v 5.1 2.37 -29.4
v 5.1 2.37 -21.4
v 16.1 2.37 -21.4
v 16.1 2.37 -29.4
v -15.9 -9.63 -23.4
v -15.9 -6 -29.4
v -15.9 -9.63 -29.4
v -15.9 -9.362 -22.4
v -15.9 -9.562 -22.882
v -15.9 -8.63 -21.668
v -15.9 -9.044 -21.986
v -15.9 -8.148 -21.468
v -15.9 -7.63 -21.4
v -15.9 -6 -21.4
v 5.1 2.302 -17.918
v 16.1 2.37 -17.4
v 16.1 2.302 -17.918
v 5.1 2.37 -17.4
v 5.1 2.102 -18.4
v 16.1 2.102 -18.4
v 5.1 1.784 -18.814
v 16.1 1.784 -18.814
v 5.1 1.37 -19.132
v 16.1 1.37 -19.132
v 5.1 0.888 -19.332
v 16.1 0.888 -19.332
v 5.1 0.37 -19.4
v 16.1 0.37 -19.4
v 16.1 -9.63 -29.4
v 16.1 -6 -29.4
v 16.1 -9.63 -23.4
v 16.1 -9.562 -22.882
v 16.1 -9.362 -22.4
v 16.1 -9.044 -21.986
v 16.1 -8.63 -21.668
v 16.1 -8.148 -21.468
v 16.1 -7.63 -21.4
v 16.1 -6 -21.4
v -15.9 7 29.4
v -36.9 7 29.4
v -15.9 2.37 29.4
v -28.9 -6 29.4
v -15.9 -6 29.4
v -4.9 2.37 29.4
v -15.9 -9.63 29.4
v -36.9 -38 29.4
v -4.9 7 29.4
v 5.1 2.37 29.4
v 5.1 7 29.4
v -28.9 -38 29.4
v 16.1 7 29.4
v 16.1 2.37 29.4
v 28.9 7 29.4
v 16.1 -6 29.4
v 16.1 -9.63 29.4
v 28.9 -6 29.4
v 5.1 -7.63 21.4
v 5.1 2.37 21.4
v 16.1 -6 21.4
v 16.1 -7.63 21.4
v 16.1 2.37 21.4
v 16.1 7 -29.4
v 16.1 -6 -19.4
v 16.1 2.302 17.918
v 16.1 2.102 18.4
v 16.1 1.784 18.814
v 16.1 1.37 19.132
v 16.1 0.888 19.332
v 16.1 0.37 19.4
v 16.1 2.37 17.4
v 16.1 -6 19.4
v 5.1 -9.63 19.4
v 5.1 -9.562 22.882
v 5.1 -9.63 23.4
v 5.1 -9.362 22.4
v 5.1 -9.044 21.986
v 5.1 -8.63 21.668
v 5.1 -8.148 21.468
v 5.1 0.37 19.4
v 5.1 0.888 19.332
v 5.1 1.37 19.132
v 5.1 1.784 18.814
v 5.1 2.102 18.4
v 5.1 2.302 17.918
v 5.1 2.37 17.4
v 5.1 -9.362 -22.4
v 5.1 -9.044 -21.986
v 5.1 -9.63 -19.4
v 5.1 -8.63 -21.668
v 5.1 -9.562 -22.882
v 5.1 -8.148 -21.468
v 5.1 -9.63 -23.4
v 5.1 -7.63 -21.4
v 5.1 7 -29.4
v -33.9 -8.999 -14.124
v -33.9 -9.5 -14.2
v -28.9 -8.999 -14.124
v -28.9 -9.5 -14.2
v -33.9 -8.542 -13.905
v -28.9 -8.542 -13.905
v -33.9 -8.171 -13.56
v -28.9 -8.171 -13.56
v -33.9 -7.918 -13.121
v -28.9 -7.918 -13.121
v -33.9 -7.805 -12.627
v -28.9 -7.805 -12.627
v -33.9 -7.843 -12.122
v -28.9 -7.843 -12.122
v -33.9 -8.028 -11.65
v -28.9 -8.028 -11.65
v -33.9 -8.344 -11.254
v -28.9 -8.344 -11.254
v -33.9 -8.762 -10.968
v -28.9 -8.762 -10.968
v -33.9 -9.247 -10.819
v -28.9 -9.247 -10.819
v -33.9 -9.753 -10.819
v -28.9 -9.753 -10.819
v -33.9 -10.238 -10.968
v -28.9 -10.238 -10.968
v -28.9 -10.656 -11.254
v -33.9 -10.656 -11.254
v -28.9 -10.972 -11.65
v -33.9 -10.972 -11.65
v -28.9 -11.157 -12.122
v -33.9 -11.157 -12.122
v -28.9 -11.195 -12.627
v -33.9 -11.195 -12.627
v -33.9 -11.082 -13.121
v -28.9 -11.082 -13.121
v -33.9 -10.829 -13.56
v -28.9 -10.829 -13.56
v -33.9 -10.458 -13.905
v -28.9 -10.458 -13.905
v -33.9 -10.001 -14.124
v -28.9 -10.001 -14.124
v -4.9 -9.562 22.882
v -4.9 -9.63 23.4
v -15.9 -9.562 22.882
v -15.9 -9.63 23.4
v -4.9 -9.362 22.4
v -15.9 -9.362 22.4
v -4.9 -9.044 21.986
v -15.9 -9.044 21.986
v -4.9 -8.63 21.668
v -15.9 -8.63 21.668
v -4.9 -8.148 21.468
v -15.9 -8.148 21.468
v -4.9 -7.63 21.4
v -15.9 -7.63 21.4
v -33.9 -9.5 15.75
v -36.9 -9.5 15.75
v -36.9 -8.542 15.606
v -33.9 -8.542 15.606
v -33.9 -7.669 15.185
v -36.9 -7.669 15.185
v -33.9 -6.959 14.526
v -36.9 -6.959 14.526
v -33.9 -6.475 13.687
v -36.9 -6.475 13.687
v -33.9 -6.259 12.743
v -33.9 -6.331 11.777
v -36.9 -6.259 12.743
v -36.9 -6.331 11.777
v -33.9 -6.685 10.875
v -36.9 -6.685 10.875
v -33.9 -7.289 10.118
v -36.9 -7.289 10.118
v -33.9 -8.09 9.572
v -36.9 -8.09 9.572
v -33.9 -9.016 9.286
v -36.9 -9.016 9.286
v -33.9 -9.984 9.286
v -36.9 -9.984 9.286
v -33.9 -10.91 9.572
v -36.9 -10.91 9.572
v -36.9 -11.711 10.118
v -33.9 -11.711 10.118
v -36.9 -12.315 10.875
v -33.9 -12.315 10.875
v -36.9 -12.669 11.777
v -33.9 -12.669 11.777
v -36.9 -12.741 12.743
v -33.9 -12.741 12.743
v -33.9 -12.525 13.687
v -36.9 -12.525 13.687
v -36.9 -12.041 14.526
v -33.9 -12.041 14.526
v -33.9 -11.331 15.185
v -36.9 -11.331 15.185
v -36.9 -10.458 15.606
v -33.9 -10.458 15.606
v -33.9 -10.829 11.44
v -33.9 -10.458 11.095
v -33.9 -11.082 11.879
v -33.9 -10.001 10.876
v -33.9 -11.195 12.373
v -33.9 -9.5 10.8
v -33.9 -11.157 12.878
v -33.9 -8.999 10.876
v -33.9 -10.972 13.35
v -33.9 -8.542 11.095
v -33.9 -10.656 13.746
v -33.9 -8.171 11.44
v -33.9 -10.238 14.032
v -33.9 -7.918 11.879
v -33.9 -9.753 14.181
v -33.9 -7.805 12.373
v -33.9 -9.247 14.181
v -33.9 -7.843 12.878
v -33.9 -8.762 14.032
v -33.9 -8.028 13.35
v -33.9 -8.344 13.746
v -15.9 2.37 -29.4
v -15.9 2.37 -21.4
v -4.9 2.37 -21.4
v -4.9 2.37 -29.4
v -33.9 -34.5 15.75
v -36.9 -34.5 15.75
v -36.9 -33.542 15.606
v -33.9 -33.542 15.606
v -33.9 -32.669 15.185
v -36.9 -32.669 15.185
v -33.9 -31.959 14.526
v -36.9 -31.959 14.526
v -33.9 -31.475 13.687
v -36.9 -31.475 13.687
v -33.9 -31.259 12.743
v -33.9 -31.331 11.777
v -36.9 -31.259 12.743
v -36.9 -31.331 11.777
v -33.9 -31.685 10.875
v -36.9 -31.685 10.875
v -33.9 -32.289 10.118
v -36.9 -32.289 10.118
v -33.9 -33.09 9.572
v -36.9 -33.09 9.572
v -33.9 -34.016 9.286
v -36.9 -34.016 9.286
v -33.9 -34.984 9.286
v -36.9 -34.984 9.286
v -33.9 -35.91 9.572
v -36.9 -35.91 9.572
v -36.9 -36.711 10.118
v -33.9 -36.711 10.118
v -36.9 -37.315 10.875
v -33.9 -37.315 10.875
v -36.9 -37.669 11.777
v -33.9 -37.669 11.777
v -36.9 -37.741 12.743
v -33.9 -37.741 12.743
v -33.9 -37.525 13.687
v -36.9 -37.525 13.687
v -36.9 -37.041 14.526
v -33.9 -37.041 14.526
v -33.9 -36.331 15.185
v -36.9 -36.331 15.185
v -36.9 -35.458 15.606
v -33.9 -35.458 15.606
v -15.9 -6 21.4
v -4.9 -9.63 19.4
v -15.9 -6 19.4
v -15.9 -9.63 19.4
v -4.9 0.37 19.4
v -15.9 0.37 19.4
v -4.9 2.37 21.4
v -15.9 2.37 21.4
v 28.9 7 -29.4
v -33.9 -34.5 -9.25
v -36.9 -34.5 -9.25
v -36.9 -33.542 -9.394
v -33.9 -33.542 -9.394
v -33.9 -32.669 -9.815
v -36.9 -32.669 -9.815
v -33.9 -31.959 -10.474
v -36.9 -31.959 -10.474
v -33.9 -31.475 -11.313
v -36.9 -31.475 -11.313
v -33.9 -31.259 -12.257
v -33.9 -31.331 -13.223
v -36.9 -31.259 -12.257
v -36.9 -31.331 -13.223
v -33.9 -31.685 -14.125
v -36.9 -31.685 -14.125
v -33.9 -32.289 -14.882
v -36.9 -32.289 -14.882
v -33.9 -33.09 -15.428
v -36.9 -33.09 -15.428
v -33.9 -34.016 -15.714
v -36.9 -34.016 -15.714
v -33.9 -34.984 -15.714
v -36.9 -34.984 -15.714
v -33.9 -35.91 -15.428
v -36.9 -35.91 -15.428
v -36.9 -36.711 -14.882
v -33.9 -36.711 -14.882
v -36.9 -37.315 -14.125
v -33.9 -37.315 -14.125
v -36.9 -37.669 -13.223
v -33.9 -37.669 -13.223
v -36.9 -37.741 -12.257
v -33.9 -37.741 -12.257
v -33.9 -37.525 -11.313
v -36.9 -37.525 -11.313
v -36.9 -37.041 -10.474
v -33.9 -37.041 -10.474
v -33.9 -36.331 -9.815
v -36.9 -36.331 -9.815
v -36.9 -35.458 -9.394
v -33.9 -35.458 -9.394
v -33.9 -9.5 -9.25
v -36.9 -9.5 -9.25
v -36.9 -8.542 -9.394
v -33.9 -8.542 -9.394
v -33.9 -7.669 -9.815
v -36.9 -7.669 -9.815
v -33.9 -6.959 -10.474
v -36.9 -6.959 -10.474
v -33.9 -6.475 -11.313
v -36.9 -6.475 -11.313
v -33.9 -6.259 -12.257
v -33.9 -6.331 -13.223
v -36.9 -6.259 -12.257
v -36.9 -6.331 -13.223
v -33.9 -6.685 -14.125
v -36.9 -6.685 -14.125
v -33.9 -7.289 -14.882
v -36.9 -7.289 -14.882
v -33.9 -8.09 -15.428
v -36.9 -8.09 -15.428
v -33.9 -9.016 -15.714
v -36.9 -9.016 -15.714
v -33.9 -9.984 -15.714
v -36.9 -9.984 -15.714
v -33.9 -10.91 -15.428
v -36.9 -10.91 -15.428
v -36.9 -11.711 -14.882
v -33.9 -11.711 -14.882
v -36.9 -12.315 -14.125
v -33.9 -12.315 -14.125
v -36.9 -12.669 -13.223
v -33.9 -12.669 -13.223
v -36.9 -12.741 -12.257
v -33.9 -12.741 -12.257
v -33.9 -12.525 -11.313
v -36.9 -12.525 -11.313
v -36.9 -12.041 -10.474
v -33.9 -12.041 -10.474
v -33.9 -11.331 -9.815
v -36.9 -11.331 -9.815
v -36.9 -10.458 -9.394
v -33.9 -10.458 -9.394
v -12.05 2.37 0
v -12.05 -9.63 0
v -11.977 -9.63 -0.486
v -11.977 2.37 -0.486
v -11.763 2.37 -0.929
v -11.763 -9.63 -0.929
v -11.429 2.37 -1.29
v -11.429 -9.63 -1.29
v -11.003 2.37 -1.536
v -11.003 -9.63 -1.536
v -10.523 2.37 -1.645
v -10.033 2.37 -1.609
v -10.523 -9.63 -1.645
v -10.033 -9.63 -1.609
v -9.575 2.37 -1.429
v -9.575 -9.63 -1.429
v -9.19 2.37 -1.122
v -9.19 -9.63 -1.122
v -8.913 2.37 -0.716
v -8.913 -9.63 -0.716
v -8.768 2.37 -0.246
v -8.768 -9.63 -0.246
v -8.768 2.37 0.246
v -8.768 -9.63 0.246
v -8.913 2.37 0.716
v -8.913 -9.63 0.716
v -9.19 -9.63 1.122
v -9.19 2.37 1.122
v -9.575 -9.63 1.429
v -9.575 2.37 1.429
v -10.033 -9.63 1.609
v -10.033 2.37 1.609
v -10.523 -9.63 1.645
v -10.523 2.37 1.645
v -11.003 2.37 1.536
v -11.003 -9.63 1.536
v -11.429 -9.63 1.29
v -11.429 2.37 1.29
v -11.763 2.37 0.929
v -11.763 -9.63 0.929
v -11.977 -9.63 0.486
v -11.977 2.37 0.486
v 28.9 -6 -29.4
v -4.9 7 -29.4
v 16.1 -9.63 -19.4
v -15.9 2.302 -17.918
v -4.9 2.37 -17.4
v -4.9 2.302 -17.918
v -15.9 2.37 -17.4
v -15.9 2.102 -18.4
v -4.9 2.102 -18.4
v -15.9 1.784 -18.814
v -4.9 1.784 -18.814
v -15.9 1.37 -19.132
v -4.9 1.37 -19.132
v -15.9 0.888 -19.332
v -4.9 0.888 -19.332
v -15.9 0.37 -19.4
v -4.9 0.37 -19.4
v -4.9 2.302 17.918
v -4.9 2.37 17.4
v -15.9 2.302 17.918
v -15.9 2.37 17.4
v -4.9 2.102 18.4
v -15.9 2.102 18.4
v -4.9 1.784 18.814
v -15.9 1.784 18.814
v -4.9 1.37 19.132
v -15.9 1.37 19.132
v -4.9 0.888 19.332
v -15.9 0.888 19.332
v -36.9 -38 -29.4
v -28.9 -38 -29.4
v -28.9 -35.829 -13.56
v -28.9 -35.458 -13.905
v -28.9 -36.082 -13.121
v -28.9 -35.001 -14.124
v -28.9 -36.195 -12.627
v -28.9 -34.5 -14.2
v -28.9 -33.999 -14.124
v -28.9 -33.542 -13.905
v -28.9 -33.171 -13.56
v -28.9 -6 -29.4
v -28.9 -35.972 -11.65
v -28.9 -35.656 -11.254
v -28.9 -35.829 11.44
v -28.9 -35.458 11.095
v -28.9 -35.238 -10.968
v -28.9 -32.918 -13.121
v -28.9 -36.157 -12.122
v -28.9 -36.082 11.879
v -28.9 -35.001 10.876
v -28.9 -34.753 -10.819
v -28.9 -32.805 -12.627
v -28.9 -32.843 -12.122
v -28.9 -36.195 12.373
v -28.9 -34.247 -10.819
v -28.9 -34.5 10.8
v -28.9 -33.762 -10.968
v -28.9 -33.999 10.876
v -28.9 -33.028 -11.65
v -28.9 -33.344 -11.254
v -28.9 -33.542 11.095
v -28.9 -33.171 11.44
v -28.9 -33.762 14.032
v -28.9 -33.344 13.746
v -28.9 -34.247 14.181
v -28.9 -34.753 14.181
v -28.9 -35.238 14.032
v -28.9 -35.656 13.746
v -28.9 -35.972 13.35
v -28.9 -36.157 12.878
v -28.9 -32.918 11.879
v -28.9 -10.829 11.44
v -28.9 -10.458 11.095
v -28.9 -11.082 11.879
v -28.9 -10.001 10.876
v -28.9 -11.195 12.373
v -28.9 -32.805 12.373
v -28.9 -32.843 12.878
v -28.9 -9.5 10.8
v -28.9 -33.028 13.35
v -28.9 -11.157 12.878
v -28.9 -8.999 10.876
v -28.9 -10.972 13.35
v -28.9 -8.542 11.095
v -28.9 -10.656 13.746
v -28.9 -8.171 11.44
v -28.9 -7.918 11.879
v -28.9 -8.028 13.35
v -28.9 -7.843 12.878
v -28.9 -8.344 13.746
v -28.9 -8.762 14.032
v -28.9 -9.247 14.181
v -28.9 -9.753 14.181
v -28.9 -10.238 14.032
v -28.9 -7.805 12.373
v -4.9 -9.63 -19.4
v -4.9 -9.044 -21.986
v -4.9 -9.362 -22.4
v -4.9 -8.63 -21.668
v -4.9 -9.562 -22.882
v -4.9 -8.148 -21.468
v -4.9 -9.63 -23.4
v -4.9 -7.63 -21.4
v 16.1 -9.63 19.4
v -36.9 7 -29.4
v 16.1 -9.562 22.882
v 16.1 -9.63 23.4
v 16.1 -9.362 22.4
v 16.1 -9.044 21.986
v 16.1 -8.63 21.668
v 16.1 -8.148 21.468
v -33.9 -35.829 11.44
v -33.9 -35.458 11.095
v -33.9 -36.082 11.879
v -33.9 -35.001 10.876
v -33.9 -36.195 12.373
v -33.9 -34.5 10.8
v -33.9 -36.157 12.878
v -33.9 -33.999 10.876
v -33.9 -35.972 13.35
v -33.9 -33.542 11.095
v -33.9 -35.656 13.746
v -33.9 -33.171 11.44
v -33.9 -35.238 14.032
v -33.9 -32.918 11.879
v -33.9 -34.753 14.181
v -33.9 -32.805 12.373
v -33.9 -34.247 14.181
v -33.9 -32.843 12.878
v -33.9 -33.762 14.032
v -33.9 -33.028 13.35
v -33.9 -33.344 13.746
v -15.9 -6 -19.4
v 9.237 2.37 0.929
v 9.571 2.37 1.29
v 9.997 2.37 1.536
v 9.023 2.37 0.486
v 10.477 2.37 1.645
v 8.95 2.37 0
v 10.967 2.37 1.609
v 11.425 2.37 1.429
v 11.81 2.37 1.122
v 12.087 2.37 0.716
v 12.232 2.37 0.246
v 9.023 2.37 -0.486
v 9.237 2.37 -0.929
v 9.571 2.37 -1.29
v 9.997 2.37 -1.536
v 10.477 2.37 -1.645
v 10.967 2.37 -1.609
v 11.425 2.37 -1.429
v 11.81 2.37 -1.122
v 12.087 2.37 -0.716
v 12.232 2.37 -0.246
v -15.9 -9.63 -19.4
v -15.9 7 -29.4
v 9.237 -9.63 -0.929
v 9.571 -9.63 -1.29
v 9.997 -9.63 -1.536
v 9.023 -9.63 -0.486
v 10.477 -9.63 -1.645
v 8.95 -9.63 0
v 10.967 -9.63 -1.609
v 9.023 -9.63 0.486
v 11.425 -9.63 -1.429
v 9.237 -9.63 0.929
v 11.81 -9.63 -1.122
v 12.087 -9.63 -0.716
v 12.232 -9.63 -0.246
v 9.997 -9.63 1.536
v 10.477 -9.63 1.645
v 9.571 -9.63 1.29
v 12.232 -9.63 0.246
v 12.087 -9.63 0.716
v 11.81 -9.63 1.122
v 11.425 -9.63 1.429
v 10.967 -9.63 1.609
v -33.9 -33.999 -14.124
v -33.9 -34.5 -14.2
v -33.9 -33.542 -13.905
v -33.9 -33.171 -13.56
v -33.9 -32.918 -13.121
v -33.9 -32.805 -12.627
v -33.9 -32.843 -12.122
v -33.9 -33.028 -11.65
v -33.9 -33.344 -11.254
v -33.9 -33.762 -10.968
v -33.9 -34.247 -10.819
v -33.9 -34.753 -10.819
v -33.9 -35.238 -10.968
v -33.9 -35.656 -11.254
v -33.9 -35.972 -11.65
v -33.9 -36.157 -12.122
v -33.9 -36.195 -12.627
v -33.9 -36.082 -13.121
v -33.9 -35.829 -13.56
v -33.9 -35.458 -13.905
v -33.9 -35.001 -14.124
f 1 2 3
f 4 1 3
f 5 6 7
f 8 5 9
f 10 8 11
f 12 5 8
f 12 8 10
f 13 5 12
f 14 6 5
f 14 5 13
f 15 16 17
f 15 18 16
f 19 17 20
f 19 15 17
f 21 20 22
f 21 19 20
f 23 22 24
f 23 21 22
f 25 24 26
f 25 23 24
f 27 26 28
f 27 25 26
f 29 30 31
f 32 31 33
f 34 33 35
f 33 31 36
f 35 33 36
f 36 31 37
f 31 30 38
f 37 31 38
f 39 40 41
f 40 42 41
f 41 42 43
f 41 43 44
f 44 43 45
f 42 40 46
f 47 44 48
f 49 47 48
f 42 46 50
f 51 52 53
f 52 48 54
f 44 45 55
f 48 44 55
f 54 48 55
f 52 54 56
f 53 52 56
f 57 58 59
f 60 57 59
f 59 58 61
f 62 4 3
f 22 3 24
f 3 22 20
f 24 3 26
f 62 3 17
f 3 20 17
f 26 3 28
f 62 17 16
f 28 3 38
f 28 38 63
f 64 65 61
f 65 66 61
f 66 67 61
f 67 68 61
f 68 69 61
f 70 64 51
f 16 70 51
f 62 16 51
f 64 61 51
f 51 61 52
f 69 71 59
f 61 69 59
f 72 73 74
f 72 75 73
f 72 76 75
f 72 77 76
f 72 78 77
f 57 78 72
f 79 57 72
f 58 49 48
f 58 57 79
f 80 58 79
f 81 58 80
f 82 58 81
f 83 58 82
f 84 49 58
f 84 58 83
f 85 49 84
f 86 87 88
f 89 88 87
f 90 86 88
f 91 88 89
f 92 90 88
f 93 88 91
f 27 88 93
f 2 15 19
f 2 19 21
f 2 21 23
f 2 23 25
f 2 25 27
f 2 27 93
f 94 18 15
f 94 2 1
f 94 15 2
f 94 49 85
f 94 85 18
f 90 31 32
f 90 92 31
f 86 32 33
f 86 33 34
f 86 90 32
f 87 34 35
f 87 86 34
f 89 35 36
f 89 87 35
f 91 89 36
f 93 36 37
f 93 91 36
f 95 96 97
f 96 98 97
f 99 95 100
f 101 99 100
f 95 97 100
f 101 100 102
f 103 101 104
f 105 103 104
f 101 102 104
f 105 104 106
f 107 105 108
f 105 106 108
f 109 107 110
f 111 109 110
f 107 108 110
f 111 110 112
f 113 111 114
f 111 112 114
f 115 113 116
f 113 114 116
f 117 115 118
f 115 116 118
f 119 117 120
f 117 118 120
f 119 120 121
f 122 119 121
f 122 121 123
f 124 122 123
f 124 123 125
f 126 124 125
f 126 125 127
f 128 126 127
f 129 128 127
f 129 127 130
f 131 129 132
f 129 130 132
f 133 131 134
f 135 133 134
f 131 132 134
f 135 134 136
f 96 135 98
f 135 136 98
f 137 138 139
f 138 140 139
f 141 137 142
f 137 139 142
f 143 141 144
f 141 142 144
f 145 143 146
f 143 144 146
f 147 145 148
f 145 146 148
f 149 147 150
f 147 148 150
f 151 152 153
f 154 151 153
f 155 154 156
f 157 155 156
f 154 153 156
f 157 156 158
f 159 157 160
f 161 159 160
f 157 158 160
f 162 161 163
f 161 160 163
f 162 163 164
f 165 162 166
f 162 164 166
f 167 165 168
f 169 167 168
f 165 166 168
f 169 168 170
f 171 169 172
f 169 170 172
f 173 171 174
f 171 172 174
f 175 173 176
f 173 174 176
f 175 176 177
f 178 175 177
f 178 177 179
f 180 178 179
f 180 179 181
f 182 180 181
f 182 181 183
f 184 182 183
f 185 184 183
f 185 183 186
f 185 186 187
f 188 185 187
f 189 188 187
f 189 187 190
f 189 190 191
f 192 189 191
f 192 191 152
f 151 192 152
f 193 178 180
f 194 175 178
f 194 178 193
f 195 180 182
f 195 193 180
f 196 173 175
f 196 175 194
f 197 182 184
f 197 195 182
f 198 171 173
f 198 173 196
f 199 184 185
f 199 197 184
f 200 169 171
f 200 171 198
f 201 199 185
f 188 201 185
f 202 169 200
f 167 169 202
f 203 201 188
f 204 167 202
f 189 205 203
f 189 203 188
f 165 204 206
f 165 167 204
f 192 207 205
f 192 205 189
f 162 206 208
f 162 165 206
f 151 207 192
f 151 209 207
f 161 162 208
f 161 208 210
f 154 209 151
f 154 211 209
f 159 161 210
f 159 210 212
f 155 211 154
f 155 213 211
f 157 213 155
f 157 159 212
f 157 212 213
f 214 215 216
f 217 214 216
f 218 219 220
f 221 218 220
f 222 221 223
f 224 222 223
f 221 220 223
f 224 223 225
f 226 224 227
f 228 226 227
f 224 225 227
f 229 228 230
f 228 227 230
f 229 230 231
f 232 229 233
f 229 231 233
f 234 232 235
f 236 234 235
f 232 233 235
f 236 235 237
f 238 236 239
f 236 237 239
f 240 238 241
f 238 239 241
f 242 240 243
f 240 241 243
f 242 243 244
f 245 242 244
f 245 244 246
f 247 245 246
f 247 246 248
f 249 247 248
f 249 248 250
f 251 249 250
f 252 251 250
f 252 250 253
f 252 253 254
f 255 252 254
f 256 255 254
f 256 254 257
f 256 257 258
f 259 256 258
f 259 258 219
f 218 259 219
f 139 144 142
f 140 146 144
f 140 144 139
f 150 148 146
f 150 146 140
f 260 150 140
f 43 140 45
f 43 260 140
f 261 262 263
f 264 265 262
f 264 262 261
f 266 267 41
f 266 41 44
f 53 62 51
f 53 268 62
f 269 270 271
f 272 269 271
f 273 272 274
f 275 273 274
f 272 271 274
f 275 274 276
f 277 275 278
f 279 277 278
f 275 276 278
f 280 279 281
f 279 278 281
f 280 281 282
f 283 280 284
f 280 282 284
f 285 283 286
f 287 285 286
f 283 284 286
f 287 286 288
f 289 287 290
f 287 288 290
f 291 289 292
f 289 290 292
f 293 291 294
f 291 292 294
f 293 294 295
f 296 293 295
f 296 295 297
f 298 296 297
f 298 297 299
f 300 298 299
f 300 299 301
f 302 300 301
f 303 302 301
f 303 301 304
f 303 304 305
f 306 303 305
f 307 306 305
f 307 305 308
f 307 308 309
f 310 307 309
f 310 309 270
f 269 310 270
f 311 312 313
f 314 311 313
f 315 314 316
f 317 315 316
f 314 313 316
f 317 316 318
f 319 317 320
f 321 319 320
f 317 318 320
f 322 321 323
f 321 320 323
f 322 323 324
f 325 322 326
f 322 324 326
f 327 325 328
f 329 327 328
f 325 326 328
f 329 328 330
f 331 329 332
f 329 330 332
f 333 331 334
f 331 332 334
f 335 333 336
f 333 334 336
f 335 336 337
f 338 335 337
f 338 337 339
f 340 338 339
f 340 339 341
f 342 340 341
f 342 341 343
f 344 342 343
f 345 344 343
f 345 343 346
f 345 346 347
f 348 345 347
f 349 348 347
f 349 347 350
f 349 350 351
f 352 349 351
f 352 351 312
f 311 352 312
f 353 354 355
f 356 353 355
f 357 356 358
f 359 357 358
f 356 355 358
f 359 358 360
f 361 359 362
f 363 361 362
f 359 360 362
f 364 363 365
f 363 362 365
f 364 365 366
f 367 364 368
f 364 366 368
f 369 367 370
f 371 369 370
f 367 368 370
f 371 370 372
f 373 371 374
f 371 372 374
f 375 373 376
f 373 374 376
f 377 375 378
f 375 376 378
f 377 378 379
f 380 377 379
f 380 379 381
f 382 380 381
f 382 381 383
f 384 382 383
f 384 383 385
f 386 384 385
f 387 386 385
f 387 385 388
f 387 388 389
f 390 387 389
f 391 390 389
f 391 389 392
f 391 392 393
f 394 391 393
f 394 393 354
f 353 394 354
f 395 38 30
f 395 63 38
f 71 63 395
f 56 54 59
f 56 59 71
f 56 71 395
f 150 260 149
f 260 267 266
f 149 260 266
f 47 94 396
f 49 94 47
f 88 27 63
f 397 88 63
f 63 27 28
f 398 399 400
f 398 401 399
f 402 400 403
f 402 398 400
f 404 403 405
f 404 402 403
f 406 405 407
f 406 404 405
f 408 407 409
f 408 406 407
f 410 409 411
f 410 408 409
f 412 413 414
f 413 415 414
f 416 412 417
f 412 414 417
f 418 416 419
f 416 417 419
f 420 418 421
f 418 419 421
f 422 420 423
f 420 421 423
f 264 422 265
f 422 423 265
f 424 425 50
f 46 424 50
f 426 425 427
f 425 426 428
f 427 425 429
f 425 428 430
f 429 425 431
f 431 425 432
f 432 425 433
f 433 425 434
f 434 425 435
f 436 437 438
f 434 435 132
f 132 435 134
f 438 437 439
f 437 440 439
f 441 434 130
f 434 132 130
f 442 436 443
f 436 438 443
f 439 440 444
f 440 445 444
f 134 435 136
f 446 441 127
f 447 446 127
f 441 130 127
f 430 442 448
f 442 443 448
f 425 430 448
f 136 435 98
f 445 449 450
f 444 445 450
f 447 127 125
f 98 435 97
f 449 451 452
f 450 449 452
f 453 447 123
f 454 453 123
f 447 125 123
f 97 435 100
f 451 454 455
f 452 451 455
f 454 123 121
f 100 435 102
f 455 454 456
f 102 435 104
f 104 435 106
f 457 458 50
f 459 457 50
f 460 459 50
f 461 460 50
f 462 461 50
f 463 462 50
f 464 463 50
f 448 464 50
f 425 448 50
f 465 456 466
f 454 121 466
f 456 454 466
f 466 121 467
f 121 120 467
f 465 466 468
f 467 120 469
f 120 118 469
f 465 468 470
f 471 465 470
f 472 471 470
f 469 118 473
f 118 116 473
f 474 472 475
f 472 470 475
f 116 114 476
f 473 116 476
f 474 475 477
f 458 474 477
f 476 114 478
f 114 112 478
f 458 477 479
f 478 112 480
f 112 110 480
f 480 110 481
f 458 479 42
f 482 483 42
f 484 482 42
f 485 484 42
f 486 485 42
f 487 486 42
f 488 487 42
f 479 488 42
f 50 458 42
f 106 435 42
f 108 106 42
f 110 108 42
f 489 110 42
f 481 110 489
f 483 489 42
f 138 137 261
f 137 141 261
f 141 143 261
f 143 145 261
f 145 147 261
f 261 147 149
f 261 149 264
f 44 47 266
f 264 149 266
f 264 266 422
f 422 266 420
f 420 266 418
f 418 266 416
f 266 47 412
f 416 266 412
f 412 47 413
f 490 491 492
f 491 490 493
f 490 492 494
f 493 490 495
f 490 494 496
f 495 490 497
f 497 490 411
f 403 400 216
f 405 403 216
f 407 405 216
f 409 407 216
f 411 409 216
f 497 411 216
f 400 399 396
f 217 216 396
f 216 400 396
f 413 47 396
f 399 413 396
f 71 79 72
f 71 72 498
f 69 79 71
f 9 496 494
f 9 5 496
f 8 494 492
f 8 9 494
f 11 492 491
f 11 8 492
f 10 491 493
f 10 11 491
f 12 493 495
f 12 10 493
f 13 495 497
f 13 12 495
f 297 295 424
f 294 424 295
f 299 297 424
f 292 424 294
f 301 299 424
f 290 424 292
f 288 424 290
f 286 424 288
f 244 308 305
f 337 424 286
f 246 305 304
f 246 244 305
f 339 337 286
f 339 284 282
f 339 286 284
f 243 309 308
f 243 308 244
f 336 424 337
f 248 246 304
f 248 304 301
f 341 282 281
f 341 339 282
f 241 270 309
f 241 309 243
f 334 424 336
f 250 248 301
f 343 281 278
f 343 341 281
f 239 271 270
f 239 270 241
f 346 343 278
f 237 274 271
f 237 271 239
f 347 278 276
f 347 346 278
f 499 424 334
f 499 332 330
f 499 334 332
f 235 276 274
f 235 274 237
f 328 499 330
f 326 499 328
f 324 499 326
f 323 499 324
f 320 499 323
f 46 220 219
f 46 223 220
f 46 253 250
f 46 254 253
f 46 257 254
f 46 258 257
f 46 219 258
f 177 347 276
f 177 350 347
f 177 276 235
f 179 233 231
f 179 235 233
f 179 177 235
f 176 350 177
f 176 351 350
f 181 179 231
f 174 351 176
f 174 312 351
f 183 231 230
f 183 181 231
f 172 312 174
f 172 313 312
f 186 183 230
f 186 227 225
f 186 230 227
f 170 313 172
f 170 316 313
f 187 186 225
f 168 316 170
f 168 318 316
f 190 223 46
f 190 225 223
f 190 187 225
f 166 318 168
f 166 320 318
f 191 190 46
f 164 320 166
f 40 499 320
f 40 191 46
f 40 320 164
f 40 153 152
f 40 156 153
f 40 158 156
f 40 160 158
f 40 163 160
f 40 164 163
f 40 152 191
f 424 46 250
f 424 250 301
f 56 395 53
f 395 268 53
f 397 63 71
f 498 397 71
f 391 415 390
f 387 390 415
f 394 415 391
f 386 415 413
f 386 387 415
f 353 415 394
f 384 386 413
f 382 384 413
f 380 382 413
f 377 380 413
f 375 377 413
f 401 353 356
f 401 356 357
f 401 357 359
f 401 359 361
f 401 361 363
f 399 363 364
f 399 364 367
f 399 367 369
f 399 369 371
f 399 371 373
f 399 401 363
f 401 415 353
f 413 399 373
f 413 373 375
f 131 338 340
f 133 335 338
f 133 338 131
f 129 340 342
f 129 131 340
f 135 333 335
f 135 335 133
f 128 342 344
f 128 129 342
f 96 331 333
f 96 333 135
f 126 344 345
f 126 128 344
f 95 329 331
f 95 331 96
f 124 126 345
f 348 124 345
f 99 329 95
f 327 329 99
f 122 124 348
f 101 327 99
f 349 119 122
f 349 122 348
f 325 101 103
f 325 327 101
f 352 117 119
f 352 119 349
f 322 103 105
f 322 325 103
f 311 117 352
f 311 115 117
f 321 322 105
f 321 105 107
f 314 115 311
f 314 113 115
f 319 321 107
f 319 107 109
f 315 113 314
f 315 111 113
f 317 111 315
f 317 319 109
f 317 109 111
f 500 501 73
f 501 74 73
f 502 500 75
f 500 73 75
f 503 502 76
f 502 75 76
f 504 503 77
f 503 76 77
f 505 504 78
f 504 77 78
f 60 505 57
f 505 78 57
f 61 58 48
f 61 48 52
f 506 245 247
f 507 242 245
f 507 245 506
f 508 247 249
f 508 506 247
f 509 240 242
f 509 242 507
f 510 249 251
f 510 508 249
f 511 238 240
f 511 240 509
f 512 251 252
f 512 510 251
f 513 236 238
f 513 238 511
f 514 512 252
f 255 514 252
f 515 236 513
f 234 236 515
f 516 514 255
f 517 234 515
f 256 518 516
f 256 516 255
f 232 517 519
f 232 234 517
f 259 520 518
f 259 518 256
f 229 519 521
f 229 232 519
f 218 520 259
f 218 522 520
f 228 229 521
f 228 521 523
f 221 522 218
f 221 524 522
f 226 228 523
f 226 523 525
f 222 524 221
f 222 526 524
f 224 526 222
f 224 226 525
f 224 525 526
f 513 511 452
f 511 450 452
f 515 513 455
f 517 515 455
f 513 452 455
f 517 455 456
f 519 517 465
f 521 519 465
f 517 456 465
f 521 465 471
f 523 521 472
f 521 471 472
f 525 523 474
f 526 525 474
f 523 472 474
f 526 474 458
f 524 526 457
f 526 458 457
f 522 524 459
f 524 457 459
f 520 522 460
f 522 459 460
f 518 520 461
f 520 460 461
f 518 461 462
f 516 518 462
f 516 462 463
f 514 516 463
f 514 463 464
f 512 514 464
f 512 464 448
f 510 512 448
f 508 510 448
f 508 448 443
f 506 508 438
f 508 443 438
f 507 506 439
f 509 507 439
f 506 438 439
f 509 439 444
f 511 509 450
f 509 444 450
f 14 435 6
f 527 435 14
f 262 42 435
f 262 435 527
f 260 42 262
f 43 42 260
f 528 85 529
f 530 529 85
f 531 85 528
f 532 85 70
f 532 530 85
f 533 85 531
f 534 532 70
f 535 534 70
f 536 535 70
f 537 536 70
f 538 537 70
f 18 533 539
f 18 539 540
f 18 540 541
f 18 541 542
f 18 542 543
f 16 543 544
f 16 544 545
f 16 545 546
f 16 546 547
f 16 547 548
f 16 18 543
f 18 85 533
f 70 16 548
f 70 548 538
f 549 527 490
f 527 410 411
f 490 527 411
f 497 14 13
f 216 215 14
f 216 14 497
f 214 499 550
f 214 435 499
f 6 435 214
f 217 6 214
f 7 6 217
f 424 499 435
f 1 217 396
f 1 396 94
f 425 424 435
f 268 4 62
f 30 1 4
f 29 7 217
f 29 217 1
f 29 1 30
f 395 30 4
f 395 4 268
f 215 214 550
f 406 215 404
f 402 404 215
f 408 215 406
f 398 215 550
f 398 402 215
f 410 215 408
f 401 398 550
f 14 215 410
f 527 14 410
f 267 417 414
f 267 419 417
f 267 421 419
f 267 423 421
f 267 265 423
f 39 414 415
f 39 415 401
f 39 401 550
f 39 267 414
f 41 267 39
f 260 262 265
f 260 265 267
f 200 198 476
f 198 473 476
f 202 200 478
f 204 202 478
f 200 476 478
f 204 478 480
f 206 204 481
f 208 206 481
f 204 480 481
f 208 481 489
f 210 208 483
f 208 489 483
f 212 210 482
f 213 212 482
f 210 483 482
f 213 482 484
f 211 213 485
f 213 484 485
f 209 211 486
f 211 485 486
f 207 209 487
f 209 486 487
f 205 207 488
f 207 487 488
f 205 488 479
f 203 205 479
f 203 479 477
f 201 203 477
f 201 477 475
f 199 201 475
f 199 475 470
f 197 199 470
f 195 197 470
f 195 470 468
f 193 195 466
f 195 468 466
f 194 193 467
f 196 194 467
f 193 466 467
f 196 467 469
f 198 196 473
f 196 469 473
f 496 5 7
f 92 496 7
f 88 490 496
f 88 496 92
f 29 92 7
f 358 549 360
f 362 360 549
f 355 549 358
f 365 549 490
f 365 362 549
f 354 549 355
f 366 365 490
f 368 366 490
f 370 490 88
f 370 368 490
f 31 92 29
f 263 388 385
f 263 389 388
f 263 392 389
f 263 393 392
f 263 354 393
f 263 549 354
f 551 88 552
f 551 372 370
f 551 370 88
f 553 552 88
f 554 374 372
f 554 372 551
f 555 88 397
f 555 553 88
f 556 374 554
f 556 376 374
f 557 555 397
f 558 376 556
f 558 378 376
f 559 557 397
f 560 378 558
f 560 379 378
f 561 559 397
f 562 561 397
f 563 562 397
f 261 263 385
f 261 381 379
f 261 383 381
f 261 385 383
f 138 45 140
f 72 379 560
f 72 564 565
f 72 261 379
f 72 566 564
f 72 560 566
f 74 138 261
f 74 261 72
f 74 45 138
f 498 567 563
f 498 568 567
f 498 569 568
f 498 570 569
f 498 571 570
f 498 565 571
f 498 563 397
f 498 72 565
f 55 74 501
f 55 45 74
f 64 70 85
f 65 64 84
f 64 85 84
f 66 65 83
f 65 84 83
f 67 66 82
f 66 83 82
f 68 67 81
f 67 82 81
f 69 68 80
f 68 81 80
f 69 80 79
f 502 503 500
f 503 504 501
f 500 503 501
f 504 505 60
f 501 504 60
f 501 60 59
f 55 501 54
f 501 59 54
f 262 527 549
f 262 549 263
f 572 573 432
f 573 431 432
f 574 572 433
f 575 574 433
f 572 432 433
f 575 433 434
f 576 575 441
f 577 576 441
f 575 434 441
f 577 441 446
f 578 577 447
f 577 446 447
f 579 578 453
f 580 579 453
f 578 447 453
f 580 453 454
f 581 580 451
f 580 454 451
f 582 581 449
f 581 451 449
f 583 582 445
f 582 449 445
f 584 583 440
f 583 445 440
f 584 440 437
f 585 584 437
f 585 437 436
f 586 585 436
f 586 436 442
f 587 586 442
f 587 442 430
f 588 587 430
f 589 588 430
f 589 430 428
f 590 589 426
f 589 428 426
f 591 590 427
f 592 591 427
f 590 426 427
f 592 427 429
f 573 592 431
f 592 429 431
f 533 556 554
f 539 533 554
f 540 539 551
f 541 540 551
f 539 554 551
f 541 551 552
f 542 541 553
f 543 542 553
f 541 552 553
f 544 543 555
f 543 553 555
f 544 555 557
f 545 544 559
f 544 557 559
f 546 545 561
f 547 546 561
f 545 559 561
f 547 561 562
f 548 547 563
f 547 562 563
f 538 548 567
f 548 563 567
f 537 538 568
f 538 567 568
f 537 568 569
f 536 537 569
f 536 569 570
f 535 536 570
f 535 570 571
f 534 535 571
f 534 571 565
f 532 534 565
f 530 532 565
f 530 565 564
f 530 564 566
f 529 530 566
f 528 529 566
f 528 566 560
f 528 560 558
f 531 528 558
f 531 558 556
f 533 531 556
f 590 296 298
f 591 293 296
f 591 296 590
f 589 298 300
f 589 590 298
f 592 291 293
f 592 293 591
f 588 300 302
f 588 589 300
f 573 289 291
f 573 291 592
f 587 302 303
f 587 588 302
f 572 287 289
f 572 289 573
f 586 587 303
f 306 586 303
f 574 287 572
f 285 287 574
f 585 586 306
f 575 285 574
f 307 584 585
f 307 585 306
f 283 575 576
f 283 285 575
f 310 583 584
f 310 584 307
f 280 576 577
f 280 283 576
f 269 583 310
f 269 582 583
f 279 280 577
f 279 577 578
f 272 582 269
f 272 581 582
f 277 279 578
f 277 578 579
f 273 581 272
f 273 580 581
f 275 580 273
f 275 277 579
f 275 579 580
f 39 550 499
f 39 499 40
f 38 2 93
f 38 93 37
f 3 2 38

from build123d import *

# Parameters (mm, degrees)
SKETCH1_W                       = 57.8
SKETCH1_H                       = 58.8
BOSS_EXTRUDE1_DEPTH             = 7
SKETCH5_W                       = 57.8
SKETCH5_H                       = 58.8
BOSS_EXTRUDE2_DEPTH             = 6
SKETCH6_W                       = 58.8
SKETCH6_H                       = 45
BOSS_EXTRUDE3_DEPTH             = 8
CBORE_FOR_M3_SHCS2_D            = 3.4
CBORE_FOR_M3_SHCS2_CBORE_D      = 6.5
CBORE_FOR_M3_SHCS2_CBORE_DEPTH  = 3
SKETCH10_W                      = 32
SKETCH10_H                      = 58.8
BOSS_EXTRUDE4_DEPTH             = 3.63
CUT_EXTRUDE1_START              = -4.63
SKETCH11_W                      = 32
SKETCH11_H                      = 8
CUT_EXTRUDE1_DEPTH              = 4.63
SKETCH12_W                      = 32
SKETCH12_H                      = 2
CUT_EXTRUDE2_DEPTH              = 63.094338711
SKETCH17_W                      = 32
SKETCH17_H                      = 58.8
CUT_EXTRUDE3_DEPTH              = 20
BOSS_EXTRUDE5_REACH             = 64.094
SKETCH18_W                      = 10
SKETCH18_H                      = 58.8
BOSS_EXTRUDE5_DIRECTION_2_REACH = 64.094
FILLET1_R                       = 2
M4X0_7_TAPPED_HOLE1_D           = 3.3


with BuildPart() as part:
    # Sketch1 → Boss-Extrude1 (new body)
    with BuildSketch(Plane(origin=(0, 0, 0), x_dir=(1, 0, 0), z_dir=(0, 1, 0))):
        Rectangle(SKETCH1_W, SKETCH1_H)
    extrude(amount=BOSS_EXTRUDE1_DEPTH)

    # Sketch5 → Boss-Extrude2 (add)
    with BuildSketch(Plane.XZ):
        Rectangle(SKETCH5_W, SKETCH5_H)
    extrude(amount=BOSS_EXTRUDE2_DEPTH)

    # Sketch6 → Boss-Extrude3 (add)
    with BuildSketch(Plane.ZY.offset(28.9)):
        with Locations((0, -15.5)):
            Rectangle(SKETCH6_W, SKETCH6_H)
    extrude(amount=BOSS_EXTRUDE3_DEPTH)

    # CBORE for M3 SHCS2 (through all)
    with Locations(Plane.ZY.offset(36.9)):
        with Locations((-12.5, -9.5), (12.5, -9.5), (12.5, -34.5), (-12.5, -34.5)):
            CounterBoreHole(CBORE_FOR_M3_SHCS2_D / 2, CBORE_FOR_M3_SHCS2_CBORE_D / 2, CBORE_FOR_M3_SHCS2_CBORE_DEPTH)

    # Sketch10 → Boss-Extrude4 (add)
    with BuildSketch(Plane.XZ.offset(6)):
        with Locations((0.1, 0)):
            Rectangle(SKETCH10_W, SKETCH10_H)
    extrude(amount=BOSS_EXTRUDE4_DEPTH)

    # Sketch11 → Cut-Extrude1 (cut)
    with BuildSketch(Plane(origin=(0, 7, 0), x_dir=(1, 0, 0), z_dir=(0, 1, 0)).offset(CUT_EXTRUDE1_START)):
        with Locations((0.1, -25.4)):
            Rectangle(SKETCH11_W, SKETCH11_H)
    cut_extrude1 = extrude(amount=CUT_EXTRUDE1_DEPTH, mode=Mode.SUBTRACT)

    # Sketch12 → Cut-Extrude2 (cut, symmetric)
    with BuildSketch(Plane(origin=(0, 2.37, 0), x_dir=(1, 0, 0), z_dir=(0, 1, 0))):
        with Locations((0.1, -20.4)):
            Rectangle(SKETCH12_W, SKETCH12_H)
    cut_extrude2 = extrude(amount=CUT_EXTRUDE2_DEPTH, both=True, mode=Mode.SUBTRACT)

    # Mirror1: Cut-Extrude1, Cut-Extrude2 across plane
    add(cut_extrude1.mirror(Plane.XY), mode=Mode.SUBTRACT)
    add(cut_extrude2.mirror(Plane.XY), mode=Mode.SUBTRACT)

    # Sketch17 → Cut-Extrude3 (cut)
    with BuildSketch(Plane(origin=(0, 2.37, 0), x_dir=(1, 0, 0), z_dir=(0, 1, 0))):
        with Locations((0.1, 0)):
            Rectangle(SKETCH17_W, SKETCH17_H)
    extrude(amount=CUT_EXTRUDE3_DEPTH, mode=Mode.SUBTRACT)

    # Boss-Extrude5: up to this face of the body (flat: up to its plane)
    boss_extrude5_end = Plane(part.part.faces().sort_by_distance((22.5, 7, 0))[0])
    # Sketch18 → Boss-Extrude5 (add, up to the picked face)
    with BuildSketch(Plane(origin=(0, 2.37, 0), x_dir=(1, 0, 0), z_dir=(0, 1, 0)), mode=Mode.PRIVATE) as boss_extrude5_sk1:
        with Locations((0.1, 0)):
            Rectangle(SKETCH18_W, SKETCH18_H)
    boss_extrude5_tool1 = split(extrude(boss_extrude5_sk1.sketch, amount=BOSS_EXTRUDE5_REACH, mode=Mode.PRIVATE), bisect_by=boss_extrude5_end, keep=Keep.BOTH, mode=Mode.PRIVATE)
    add(boss_extrude5_tool1.solids().sort_by(Axis((0.1, 2.37, 0), (0, 1, 0)))[0])

    # Boss-Extrude5 direction 2: up to this face of the body (flat: up to its plane)
    boss_extrude5_direction_2_end = Plane(part.part.faces().sort_by_distance((0.1, -9.63, 0))[0])
    # Sketch18 → Boss-Extrude5 direction 2 (add, up to the picked face)
    with BuildSketch(Plane(origin=(0, 2.37, 0), x_dir=(1, 0, 0), z_dir=(0, 1, 0)), mode=Mode.PRIVATE) as boss_extrude5_direction_2_sk1:
        with Locations((0.1, 0)):
            Rectangle(SKETCH18_W, SKETCH18_H)
    boss_extrude5_direction_2_tool1 = split(extrude(boss_extrude5_direction_2_sk1.sketch, amount=-BOSS_EXTRUDE5_DIRECTION_2_REACH, mode=Mode.PRIVATE), bisect_by=boss_extrude5_direction_2_end, keep=Keep.BOTH, mode=Mode.PRIVATE)
    add(boss_extrude5_direction_2_tool1.solids().sort_by(Axis((0.1, 2.37, 0), (0, -1, 0)))[0])

    # Fillet1
    fillet1_edges = [part.edges().sort_by_distance(p)[0] for p in [
        (10.6, -9.63, 21.4),
        (10.6, -9.63, -21.4),
        (10.6, 2.37, -19.4),
        (10.6, 2.37, 19.4),
        (-10.4, 2.37, -19.4),
        (-10.4, 2.37, 19.4),
        (-10.4, -9.63, -21.4),
        (-10.4, -9.63, 21.4),
    ]]
    fillet(fillet1_edges, radius=FILLET1_R)

    # M4x0.7 Tapped Hole1 (through all)
    with Locations(Plane(origin=(0, 2.37, 0), x_dir=(1, 0, 0), z_dir=(0, 1, 0))):
        with Locations((-10.4, 0), (10.6, 0)):
            Hole(M4X0_7_TAPPED_HOLE1_D / 2)


solid = part.part
